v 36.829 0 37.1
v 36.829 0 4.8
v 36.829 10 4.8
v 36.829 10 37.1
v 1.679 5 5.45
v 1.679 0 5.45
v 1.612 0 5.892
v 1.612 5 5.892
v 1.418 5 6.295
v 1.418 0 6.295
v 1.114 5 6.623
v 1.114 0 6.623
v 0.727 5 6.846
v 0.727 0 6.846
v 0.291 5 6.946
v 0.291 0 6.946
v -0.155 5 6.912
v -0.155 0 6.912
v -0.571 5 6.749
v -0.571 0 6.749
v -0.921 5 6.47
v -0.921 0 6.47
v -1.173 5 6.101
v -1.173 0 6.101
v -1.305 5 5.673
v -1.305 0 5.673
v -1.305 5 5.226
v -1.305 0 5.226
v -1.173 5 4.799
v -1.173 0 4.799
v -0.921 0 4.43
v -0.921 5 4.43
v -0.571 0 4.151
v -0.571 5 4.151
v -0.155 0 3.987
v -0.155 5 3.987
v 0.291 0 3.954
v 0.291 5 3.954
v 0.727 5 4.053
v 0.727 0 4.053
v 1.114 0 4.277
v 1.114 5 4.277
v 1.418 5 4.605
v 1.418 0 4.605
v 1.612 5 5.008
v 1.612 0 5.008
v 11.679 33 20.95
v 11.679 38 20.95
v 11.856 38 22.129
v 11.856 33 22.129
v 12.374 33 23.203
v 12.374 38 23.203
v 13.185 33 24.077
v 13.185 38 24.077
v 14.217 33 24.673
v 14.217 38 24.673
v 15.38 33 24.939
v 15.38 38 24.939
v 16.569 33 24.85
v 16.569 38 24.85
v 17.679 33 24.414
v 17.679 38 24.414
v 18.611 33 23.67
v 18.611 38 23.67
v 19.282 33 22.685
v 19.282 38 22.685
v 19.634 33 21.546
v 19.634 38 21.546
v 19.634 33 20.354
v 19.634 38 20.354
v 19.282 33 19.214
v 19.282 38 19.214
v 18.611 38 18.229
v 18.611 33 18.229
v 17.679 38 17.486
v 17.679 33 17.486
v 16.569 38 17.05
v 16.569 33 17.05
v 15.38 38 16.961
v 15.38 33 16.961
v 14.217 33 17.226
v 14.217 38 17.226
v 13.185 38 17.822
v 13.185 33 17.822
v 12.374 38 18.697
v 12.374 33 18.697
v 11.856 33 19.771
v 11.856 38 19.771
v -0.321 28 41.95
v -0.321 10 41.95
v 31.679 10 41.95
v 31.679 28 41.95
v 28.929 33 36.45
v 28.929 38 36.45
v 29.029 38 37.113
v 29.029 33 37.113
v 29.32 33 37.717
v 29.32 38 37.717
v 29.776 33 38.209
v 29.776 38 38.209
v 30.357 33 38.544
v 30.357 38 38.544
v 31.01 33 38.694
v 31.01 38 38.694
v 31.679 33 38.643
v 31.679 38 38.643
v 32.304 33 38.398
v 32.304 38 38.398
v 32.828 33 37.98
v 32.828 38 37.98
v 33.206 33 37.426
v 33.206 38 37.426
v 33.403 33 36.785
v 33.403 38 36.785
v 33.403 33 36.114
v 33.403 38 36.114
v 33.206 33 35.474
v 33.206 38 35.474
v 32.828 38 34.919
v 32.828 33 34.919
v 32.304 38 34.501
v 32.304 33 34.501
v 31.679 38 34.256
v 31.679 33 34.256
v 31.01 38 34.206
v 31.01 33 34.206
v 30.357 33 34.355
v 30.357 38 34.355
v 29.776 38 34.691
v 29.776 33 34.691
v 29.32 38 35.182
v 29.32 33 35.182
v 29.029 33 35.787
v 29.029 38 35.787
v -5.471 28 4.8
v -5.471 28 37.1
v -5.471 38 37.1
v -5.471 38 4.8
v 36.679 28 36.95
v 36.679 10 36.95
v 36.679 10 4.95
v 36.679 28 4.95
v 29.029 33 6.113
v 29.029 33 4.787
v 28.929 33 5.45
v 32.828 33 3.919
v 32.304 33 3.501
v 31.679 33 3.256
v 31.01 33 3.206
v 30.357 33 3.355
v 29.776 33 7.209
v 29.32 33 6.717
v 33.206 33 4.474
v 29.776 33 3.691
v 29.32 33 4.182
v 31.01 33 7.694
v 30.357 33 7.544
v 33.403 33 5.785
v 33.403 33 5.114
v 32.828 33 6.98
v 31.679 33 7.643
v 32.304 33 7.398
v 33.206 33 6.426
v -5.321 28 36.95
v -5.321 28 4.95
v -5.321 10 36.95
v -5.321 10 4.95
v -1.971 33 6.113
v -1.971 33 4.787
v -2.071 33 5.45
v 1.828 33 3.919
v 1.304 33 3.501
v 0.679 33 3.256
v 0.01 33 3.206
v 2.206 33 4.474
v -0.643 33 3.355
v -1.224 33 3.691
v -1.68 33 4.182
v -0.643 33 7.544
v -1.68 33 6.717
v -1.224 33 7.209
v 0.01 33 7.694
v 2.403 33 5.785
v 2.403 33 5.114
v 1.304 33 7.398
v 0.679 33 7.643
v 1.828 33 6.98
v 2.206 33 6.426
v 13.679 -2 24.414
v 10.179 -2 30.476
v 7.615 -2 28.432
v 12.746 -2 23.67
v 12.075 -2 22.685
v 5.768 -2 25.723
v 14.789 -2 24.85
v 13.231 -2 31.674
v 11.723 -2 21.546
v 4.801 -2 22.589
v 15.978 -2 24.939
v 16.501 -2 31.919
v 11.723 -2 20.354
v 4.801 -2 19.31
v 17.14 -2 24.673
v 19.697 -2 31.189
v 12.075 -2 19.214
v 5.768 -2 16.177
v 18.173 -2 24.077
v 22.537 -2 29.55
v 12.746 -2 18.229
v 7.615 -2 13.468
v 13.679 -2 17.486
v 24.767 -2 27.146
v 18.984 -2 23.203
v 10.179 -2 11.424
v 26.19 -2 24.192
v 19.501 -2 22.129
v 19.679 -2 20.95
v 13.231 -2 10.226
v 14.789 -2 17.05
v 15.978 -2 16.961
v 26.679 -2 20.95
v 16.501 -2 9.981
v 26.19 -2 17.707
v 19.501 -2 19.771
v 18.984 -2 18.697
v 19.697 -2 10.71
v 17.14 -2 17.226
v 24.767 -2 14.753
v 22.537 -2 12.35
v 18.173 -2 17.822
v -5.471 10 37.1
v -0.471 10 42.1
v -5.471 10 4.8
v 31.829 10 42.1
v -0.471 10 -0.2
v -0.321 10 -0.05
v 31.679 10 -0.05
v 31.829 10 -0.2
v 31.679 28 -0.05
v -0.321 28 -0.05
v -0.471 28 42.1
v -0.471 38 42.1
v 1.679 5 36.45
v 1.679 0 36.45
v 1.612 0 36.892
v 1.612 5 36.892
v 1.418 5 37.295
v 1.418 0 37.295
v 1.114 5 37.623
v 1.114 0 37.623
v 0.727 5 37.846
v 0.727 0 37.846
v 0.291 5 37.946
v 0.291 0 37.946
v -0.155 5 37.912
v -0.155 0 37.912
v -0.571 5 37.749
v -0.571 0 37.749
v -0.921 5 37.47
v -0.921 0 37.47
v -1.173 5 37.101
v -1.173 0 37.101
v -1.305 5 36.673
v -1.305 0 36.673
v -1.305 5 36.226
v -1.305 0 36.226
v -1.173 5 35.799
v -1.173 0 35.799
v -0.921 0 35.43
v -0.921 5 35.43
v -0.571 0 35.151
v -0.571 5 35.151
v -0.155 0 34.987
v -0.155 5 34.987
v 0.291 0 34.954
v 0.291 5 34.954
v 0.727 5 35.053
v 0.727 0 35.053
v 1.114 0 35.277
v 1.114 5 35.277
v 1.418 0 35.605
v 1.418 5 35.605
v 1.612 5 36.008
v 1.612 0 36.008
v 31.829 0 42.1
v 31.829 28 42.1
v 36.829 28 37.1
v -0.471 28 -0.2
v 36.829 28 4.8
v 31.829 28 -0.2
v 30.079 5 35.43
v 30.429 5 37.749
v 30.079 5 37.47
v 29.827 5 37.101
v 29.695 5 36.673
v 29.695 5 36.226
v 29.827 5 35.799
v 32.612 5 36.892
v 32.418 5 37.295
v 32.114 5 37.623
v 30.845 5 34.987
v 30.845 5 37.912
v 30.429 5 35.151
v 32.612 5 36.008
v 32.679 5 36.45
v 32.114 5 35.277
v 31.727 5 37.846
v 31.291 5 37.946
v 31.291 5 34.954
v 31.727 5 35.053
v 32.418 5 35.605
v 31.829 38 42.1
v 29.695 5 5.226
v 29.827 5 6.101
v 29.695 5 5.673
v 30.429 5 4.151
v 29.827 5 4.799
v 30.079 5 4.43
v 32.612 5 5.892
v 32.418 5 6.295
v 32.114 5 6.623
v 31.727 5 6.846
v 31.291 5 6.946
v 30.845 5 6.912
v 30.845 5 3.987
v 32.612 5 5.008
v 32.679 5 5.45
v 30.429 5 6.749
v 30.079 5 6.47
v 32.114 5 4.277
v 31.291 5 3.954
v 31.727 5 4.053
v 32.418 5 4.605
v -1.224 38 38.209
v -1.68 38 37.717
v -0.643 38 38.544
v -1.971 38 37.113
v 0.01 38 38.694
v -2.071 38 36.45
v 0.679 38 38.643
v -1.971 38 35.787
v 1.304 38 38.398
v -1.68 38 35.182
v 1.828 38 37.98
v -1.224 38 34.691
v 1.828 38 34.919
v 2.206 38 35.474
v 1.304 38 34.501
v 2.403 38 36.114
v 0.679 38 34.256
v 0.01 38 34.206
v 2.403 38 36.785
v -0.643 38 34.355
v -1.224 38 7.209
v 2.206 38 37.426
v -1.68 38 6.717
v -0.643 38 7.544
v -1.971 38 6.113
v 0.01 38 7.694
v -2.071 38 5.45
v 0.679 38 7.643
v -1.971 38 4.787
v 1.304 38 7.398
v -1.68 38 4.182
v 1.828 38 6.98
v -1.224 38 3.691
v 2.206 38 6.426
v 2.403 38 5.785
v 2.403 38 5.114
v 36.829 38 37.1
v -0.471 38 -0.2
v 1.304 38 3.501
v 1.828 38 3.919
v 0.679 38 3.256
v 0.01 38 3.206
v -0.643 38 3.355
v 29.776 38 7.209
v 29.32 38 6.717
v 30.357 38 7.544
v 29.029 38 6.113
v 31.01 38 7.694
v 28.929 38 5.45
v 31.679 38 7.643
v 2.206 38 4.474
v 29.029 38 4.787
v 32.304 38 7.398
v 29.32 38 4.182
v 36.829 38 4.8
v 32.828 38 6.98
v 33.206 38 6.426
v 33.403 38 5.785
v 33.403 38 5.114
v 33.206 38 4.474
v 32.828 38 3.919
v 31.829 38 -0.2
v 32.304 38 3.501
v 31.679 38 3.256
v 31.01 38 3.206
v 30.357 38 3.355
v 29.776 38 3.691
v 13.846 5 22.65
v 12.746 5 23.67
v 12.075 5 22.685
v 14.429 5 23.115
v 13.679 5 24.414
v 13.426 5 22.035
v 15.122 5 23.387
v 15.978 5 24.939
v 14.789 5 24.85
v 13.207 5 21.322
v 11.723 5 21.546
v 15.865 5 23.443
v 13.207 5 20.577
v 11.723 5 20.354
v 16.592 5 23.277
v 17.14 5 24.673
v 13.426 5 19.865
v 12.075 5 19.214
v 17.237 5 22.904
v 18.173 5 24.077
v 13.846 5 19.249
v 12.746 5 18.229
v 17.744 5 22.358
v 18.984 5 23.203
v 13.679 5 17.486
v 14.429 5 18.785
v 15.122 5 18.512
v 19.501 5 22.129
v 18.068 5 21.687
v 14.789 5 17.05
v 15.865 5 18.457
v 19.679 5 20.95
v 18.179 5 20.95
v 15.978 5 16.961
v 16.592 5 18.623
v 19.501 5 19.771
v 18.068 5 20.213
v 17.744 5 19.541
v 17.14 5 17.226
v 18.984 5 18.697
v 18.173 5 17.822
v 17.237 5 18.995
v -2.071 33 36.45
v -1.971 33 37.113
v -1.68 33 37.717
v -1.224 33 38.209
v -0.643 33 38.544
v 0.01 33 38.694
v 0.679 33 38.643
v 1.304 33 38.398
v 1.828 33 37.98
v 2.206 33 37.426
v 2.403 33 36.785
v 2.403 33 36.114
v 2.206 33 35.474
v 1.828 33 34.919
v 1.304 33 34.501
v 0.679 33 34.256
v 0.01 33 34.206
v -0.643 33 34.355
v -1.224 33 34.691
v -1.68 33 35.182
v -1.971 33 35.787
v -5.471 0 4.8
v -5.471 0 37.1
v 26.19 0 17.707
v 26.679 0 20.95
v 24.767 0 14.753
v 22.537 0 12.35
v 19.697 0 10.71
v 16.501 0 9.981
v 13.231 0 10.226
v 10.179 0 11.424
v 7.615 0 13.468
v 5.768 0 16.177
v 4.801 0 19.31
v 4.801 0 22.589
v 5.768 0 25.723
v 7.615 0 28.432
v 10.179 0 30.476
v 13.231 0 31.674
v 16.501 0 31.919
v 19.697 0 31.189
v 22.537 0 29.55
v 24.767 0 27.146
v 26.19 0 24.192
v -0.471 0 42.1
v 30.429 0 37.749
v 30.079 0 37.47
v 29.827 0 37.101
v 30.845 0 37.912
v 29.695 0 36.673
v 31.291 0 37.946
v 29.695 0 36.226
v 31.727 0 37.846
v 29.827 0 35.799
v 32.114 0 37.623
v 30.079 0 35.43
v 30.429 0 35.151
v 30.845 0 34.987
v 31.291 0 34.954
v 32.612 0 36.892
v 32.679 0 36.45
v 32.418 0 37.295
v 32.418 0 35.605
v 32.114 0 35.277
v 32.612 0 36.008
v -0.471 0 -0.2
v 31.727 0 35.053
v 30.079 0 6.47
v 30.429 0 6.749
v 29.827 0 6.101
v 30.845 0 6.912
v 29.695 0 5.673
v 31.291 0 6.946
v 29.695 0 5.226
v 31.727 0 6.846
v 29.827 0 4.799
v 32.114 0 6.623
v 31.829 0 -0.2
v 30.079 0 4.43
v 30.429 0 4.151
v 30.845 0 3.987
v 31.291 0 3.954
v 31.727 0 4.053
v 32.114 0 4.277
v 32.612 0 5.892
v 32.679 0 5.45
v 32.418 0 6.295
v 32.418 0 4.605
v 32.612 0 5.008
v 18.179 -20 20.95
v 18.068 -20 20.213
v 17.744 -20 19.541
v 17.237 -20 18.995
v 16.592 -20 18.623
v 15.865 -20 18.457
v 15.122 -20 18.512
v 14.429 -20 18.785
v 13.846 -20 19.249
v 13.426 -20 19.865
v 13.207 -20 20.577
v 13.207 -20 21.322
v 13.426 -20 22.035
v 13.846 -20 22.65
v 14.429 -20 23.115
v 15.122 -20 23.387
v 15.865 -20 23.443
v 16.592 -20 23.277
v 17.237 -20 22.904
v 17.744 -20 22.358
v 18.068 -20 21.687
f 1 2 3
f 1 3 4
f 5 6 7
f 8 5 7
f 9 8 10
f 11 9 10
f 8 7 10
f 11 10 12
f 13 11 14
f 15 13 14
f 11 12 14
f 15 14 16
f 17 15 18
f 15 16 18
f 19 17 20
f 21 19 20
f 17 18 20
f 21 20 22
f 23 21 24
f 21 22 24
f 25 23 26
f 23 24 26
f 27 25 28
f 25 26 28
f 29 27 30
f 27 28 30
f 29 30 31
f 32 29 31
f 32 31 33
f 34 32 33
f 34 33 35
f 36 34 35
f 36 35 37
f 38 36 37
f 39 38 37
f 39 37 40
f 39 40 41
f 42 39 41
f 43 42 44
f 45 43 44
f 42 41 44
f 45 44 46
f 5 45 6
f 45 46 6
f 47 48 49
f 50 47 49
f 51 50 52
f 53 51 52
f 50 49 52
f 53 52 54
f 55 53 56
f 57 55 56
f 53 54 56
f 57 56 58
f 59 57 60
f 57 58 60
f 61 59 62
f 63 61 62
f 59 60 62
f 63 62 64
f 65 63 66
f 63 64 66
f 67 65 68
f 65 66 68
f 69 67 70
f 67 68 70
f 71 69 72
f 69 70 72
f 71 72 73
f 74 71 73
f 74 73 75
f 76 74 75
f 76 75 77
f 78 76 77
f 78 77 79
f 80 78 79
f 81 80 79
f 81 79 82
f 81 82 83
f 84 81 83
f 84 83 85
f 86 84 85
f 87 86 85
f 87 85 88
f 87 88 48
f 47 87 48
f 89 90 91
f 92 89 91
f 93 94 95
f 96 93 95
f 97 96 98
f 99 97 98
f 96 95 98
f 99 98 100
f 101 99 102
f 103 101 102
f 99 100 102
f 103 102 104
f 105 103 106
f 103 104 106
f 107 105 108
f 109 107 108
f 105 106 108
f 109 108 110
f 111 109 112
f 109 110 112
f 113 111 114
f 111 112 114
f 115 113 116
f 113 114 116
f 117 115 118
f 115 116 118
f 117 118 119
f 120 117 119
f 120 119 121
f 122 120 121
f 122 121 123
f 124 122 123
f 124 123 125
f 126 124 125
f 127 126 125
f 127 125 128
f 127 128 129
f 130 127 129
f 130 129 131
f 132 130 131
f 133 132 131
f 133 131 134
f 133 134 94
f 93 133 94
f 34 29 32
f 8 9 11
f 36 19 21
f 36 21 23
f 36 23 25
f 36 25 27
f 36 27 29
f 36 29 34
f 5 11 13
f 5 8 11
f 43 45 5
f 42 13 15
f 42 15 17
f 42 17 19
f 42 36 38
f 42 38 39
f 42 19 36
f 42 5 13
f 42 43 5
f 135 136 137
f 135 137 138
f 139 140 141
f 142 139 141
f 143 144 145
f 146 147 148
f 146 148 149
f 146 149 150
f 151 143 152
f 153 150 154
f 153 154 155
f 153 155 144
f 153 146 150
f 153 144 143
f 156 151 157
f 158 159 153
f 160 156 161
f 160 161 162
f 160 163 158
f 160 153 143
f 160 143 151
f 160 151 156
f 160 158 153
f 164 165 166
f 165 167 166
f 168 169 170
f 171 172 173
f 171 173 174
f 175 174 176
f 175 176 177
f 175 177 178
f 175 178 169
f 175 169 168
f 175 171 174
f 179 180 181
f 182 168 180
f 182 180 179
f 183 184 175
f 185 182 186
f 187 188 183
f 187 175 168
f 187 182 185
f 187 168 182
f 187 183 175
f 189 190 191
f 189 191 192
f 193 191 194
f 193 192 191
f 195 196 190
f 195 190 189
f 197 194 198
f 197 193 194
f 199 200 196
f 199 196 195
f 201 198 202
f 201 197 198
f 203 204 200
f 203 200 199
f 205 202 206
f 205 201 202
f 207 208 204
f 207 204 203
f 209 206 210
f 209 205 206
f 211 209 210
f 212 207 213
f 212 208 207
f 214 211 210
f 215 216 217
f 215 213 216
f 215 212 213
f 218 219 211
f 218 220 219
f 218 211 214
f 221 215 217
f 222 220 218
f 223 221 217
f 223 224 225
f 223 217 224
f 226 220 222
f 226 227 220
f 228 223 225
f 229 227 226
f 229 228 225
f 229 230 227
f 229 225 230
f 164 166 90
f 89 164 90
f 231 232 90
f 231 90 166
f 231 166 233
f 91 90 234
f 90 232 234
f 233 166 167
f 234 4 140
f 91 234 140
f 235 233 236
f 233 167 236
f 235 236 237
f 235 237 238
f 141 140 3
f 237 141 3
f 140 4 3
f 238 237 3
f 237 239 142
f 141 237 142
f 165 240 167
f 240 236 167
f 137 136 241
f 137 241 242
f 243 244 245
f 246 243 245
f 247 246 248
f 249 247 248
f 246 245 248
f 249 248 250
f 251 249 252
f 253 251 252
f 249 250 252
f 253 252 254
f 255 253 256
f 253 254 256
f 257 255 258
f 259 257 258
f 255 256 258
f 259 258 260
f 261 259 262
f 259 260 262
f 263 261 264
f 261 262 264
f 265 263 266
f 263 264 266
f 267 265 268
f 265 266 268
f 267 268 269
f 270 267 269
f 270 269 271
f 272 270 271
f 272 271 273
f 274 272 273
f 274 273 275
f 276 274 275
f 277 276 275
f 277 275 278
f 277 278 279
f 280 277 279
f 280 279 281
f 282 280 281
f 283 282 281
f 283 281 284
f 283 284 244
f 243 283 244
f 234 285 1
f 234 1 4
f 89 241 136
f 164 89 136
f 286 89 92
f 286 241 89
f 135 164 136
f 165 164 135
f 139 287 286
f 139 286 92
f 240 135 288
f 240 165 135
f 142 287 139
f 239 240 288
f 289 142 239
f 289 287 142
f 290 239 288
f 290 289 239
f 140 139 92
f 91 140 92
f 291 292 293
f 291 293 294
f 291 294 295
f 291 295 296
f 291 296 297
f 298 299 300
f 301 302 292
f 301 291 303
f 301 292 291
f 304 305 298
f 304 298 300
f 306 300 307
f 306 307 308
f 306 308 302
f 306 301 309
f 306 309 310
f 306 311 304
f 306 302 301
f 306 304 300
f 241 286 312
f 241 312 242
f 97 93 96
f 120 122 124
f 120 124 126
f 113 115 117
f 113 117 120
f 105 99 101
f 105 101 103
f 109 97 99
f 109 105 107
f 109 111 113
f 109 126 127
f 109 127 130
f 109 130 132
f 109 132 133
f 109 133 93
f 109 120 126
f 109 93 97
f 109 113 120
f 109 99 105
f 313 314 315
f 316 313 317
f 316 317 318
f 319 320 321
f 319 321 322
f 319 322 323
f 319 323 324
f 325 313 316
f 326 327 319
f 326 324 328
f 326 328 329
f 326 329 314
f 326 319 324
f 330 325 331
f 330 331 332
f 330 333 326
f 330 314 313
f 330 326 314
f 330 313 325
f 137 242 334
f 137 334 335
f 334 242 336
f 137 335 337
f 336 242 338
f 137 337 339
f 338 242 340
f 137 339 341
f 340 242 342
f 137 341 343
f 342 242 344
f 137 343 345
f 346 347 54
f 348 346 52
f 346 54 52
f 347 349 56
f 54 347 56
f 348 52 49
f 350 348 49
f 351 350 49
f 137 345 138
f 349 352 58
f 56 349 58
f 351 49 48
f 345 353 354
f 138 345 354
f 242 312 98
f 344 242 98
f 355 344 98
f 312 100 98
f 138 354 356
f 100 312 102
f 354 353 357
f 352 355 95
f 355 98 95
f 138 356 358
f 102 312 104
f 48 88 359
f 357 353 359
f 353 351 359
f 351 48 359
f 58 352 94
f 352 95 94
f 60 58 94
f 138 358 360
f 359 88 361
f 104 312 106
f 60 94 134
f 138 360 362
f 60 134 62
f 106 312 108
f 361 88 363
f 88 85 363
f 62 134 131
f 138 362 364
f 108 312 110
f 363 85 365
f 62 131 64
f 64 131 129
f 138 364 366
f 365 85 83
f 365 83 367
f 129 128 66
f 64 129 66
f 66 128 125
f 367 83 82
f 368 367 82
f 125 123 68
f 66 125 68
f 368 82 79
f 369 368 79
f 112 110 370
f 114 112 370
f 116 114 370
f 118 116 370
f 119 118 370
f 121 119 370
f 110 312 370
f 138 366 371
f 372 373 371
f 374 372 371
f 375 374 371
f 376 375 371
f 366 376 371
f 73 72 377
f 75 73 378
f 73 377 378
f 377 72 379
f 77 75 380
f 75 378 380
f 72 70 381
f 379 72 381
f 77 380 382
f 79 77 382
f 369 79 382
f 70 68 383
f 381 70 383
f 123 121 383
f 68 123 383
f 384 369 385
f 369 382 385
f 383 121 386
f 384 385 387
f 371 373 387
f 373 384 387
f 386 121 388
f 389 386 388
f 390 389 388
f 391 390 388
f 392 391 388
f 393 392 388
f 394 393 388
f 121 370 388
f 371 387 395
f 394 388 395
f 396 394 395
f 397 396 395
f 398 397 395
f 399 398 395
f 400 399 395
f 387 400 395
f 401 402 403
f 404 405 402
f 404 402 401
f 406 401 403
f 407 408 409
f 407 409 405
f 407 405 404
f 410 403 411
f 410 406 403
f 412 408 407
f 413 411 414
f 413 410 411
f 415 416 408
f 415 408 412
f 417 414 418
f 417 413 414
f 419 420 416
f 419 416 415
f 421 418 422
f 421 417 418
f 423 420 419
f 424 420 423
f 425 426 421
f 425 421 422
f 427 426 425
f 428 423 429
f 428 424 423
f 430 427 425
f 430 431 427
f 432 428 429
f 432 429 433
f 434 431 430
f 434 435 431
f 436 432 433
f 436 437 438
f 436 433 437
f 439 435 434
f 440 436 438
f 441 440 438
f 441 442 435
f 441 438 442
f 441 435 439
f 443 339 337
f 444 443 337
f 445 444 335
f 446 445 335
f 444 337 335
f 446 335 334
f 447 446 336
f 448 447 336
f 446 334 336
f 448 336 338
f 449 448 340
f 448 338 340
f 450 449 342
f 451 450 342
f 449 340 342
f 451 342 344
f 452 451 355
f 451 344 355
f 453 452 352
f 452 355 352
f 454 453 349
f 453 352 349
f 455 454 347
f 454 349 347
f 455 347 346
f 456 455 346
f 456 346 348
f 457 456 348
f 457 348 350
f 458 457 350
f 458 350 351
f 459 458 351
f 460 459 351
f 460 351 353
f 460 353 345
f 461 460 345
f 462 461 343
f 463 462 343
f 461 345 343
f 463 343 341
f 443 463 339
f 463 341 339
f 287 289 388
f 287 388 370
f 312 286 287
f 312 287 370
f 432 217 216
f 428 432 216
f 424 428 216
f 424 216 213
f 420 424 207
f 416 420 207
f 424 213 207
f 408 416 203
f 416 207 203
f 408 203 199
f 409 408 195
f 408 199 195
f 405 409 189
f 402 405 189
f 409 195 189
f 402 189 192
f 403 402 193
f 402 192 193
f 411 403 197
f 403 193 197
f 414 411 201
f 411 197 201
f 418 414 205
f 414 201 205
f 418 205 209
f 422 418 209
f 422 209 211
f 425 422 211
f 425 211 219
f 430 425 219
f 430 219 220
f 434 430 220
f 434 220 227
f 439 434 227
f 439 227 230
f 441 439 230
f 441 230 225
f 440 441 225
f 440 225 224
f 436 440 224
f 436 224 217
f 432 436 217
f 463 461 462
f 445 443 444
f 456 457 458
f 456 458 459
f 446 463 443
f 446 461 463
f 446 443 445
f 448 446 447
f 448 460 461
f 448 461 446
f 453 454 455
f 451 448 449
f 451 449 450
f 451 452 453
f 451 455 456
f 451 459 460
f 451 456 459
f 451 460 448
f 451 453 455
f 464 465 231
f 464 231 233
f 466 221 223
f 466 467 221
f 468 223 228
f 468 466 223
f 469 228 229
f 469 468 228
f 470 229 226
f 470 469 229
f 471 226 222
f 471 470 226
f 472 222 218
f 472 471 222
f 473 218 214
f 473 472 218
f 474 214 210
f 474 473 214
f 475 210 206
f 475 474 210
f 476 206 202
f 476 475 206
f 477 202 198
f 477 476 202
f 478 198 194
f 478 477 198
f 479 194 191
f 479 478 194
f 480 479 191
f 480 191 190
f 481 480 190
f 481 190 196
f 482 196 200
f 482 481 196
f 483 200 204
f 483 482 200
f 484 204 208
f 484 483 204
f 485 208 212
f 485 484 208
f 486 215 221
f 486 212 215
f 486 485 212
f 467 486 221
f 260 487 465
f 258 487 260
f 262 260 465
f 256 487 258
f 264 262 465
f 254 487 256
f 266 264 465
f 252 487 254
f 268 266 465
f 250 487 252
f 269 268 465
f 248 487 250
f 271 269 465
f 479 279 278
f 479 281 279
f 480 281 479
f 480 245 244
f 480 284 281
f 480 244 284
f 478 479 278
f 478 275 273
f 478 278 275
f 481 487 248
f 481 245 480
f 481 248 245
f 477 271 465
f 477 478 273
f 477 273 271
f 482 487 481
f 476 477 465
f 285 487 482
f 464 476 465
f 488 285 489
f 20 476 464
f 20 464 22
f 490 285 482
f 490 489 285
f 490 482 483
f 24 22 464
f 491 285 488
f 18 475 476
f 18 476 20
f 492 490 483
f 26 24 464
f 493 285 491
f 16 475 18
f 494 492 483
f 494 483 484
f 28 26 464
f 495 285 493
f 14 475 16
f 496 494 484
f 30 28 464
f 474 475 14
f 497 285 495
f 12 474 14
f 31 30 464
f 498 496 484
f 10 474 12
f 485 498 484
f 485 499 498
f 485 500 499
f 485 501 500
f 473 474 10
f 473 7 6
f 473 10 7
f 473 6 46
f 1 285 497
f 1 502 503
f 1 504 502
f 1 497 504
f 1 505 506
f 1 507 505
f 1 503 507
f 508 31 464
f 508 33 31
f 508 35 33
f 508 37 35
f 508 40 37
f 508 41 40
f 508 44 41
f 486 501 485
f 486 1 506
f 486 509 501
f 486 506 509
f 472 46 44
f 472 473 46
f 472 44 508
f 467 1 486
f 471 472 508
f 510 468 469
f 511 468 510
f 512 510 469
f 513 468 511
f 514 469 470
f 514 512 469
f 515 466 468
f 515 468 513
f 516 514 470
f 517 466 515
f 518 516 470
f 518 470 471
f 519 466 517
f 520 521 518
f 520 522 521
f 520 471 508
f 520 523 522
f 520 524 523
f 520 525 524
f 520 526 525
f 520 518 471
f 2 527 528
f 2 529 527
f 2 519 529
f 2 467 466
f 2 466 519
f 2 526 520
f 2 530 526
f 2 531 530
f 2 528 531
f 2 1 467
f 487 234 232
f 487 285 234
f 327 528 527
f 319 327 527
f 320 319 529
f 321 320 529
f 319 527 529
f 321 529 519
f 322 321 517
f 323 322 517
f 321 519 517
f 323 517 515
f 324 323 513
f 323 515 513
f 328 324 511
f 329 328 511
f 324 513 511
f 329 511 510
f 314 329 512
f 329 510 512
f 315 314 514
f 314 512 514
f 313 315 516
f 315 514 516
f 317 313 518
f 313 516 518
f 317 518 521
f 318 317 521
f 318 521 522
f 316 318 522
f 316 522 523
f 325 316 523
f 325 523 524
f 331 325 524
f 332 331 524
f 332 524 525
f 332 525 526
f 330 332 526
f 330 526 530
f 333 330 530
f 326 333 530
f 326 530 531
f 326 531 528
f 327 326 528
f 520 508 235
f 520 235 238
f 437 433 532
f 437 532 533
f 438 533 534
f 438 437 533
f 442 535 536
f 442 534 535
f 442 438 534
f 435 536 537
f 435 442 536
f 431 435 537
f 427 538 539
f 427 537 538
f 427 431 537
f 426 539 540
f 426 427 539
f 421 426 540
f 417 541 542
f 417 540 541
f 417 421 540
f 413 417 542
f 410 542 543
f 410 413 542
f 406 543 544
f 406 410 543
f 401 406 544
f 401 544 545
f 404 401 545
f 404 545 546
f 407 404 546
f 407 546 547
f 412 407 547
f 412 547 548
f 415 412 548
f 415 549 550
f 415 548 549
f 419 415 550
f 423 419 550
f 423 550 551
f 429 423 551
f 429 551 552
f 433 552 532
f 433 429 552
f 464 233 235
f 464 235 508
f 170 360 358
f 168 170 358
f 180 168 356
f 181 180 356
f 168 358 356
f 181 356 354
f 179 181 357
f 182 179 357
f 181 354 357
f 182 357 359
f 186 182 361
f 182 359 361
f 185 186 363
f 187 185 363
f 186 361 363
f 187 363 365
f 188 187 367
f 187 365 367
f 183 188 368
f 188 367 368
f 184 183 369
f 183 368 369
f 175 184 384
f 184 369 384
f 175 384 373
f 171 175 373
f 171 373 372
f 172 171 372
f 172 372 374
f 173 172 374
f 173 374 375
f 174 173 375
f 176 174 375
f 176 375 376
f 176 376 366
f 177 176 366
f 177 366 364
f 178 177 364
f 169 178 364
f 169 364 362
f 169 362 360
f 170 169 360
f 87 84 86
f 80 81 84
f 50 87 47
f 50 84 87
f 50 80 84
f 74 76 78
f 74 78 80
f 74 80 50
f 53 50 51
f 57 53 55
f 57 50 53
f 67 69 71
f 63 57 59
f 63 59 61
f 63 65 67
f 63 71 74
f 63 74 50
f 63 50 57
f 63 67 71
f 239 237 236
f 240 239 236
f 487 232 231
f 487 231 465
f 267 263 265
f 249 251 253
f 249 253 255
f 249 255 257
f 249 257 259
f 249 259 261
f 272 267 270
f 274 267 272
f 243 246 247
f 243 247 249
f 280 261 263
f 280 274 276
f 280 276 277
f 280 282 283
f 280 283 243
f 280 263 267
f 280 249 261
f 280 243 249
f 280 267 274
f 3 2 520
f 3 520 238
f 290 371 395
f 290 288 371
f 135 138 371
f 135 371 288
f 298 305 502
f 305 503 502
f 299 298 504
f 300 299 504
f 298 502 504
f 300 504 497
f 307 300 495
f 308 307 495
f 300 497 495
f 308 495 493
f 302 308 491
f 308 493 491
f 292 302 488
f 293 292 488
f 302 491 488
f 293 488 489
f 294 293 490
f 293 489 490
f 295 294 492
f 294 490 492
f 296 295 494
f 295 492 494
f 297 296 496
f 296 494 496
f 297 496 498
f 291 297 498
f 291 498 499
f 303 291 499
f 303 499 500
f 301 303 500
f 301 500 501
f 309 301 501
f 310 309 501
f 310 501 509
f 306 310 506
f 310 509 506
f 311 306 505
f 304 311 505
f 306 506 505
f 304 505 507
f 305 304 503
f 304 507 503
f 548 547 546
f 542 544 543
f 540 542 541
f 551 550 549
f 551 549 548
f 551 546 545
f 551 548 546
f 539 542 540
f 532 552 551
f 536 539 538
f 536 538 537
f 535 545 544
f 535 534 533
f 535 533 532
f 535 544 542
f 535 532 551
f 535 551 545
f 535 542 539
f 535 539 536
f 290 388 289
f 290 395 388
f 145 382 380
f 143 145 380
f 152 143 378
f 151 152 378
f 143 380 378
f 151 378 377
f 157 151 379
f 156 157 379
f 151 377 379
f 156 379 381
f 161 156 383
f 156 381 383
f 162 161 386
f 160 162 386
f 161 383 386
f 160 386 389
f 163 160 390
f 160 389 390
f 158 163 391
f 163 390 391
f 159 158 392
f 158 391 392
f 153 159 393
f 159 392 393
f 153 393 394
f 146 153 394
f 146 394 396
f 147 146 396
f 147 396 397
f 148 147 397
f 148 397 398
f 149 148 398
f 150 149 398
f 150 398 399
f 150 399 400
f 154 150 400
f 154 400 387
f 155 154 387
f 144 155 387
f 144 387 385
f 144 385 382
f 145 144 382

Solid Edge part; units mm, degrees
sketch "Sketch1" plane through (0, 0, 0) normal (0, -1, 0) x (1, 0, 0)
  line L0 (-5.4714, -0.2002) -> (36.8286, -0.2002)
  line L1 (36.8286, -0.2002) -> (36.8286, 42.0998)
  line L2 (36.8286, 42.0998) -> (-5.4714, 42.0998)
  line L3 (-5.4714, 42.0998) -> (-5.4714, -0.2002)
extrude "Protrusion1" add sketch "Sketch1" against normal blind 10
sketch "Sketch2" plane through (15.6786, 0, 20.9498) normal (0, -1, 0) x (1, 0, 0)
  circle A0 centre (0, 0) radius 11
extrude "ProtrusiónExtruida_2" add sketch "Sketch2" along normal blind 2
chamfer "Chaflán_2" distance 5 angle 45 4 edges at (36.8286, 5, 42.0998) (36.8286, 5, -0.2002) (-5.4714, 5, -0.2002) (-5.4714, 5, 42.0998)
sketch "Sketch3" plane through (15.6786, -2, 20.9498) normal (0, -1, 0) x (1, 0, 0)
  circle A0 centre (0, 0) radius 4
  circle A1 centre (15.5, 15.5) radius 1.5
  circle A2 centre (-15.5, 15.5) radius 1.5
  circle A3 centre (-15.5, -15.5) radius 1.5
  circle A4 centre (15.5, -15.5) radius 1.5
extrude "VaciadoExtruido_2" cut sketch "Sketch3" against normal blind 7
sketch "Sketch4" plane through (15.6786, 5, 20.9498) normal (0, -1, 0) x (1, 0, 0)
  circle A0 centre (0, 0) radius 2.5
extrude "ProtrusiónExtruida_3" add sketch "Sketch4" along normal blind 25
sketch "Sketch5" plane through (15.6786, 10, 20.9498) normal (0, 1, 0) x (0, 0, -1)
  line L0 (-21, -21) -> (21, -21)
  line L1 (21, -21) -> (21, 21)
  line L2 (21, 21) -> (-21, 21)
  line L3 (-21, 21) -> (-21, -21)
extrude "ProtrusiónExtruida_4" add sketch "Sketch5" along normal blind 18
chamfer "Chaflán_9" distance 5 angle 45 4 edges at (-5.3214, 19, 41.9498) (36.6786, 19, 41.9498) (36.6786, 19, -0.0502) (-5.3214, 19, -0.0502)
sketch "Sketch6" plane through (15.6786, 28, 20.9498) normal (0, 1, 0) x (0, 0, -1)
  line L0 (21.15, -21.15) -> (-21.15, -21.15)
  line L1 (-21.15, -21.15) -> (-21.15, 21.15)
  line L2 (-21.15, 21.15) -> (21.15, 21.15)
  line L3 (21.15, 21.15) -> (21.15, -21.15)
extrude "ProtrusiónExtruida_5" add sketch "Sketch6" along normal blind 10
chamfer "Chaflán_10" distance 5 angle 45 4 edges at (36.8286, 33, 42.0998) (-5.4714, 33, 42.0998) (-5.4714, 33, -0.2002) (36.8286, 33, -0.2002)
sketch "Sketch7" plane through (15.6786, 38, 20.9498) normal (0, 1, 0) x (-1, 0, 0)
  circle A0 centre (0, 0) radius 4
  circle A1 centre (-15.5, 15.5) radius 2.25
  circle A2 centre (15.5, 15.5) radius 2.25
  circle A3 centre (15.5, -15.5) radius 2.25
  circle A4 centre (-15.5, -15.5) radius 2.25
extrude "VaciadoExtruido_3" cut sketch "Sketch7" against normal blind 5
